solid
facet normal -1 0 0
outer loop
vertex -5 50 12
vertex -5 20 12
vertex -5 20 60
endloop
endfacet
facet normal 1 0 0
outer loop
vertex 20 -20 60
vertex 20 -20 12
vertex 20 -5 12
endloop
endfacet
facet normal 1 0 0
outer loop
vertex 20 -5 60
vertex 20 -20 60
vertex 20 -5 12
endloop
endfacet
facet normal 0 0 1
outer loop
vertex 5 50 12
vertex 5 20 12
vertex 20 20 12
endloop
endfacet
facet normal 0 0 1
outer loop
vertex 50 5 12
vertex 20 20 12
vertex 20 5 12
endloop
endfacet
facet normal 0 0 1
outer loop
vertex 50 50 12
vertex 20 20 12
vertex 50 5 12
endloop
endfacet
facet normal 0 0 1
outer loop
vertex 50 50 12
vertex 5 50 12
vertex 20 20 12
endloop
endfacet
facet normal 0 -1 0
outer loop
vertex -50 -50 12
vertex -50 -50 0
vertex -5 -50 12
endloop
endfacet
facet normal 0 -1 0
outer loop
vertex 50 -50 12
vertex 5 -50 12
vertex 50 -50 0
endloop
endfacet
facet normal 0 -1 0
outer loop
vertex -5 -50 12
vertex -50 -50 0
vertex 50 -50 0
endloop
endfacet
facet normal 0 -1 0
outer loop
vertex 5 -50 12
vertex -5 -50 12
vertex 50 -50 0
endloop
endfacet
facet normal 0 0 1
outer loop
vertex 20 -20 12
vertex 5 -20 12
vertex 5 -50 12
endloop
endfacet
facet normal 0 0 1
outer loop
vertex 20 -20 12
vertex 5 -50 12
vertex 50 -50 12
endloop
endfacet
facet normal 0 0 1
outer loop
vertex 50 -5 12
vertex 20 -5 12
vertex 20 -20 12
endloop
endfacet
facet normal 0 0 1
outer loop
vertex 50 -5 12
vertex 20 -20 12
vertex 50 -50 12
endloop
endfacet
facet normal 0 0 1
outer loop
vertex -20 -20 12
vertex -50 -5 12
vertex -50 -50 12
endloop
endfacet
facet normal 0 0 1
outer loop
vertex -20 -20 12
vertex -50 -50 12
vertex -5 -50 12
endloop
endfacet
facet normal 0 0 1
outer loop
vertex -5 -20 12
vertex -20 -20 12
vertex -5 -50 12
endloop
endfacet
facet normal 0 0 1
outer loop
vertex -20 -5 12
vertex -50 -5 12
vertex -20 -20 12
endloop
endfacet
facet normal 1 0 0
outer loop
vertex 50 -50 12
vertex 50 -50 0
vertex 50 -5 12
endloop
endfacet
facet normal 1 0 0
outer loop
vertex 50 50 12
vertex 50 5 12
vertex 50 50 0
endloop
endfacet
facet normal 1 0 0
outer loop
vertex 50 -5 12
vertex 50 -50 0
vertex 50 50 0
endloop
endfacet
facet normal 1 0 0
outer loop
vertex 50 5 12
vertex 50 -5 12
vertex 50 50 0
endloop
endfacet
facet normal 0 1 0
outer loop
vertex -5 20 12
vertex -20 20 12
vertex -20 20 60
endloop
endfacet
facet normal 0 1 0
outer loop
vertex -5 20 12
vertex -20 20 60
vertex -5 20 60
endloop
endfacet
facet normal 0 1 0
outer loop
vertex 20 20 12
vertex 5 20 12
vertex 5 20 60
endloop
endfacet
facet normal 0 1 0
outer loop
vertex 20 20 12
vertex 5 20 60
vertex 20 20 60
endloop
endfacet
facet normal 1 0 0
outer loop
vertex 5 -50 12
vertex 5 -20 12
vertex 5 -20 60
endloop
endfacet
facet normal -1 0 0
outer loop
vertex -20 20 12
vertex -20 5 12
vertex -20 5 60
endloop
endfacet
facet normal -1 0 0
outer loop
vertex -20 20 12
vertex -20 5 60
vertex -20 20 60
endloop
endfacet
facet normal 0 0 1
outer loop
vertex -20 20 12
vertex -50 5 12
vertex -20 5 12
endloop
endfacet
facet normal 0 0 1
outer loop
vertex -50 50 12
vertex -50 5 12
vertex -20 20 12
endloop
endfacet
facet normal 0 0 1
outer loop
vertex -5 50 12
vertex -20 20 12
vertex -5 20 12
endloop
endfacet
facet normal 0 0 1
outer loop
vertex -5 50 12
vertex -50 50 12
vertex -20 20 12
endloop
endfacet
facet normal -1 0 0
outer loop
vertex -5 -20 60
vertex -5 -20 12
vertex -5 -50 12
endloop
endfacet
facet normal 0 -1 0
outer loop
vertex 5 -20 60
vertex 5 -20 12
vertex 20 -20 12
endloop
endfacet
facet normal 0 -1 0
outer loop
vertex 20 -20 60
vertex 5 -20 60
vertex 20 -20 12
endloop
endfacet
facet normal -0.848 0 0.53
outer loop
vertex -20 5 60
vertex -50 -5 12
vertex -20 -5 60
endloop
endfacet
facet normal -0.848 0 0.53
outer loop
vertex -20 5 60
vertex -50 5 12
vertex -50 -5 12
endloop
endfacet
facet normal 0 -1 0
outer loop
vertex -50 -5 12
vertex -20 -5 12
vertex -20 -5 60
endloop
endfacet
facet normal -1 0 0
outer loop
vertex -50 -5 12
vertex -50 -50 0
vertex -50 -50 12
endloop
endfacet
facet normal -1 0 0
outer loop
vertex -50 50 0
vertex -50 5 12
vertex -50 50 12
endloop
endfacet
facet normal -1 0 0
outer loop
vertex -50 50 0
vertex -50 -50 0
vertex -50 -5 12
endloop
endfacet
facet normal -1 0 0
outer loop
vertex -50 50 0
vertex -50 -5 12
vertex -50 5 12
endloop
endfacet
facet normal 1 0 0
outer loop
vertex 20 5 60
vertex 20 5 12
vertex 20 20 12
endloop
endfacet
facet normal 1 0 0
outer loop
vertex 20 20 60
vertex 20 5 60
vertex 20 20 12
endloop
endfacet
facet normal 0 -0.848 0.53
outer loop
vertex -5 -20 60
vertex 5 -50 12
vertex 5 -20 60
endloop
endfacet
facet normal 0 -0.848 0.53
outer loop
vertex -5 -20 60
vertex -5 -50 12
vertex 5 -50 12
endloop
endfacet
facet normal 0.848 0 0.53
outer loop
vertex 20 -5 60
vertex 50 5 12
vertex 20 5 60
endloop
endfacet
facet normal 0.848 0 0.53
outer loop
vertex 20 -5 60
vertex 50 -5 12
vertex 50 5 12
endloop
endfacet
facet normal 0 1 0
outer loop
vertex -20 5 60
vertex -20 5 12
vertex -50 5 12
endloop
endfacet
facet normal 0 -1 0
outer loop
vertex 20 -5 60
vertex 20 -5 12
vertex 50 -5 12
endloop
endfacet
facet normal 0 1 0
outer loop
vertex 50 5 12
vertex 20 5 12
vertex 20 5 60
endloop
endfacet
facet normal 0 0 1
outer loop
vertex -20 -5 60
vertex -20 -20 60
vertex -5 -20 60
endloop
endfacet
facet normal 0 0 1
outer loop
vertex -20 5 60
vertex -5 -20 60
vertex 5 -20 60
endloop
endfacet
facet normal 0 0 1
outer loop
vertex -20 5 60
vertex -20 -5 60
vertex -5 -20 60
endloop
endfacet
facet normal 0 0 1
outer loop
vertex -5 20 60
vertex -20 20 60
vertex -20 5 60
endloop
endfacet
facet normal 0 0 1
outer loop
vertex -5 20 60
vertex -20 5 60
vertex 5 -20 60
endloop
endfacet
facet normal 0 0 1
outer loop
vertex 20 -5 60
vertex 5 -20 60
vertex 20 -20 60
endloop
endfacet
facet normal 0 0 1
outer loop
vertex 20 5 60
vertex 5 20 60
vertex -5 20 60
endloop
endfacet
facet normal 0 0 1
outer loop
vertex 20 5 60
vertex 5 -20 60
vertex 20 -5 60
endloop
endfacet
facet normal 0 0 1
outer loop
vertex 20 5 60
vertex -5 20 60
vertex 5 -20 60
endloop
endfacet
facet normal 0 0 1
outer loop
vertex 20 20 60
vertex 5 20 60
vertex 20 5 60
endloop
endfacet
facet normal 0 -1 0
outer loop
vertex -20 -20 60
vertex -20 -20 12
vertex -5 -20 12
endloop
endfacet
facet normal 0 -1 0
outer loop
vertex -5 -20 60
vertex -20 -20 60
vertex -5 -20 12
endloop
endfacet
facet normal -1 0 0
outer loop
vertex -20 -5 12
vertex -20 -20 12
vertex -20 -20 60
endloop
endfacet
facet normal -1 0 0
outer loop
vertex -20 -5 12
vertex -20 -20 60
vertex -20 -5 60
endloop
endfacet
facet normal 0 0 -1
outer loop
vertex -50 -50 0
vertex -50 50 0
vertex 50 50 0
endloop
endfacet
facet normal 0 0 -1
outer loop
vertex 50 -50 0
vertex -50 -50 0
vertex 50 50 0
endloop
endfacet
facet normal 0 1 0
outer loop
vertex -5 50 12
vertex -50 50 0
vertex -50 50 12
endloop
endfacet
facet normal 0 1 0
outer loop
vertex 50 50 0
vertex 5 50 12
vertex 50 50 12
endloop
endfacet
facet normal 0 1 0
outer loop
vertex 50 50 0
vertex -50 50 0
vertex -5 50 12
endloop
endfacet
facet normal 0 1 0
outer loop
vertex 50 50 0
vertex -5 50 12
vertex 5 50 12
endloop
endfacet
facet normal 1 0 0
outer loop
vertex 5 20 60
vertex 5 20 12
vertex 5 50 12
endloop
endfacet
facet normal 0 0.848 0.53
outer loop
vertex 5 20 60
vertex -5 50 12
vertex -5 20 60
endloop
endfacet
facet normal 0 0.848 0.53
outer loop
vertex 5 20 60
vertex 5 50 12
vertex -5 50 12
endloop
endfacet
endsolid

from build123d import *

# Parameters (mm, degrees)
SKETCH_W           = 100
SKETCH_H           = 100
PAD_DEPTH          = 12
SKETCH001_W        = 40
SKETCH001_H        = 40
PAD001_DEPTH       = 48
PAD002_DEPTH       = 5
POLARPATTERN_COUNT = 4


with BuildPart() as part:
    # Sketch → Pad (new body)
    with BuildSketch(Plane.XY):
        Rectangle(SKETCH_W, SKETCH_H)
    extrude(amount=PAD_DEPTH)

    # Sketch001 (on Face6 of Pad) → Pad001 (join)
    with BuildSketch(Plane.XY.offset(12)):
        Rectangle(SKETCH001_W, SKETCH001_H)
    extrude(amount=PAD001_DEPTH)

    # Sketch002 → Pad002 (join, symmetric)
    with BuildSketch(Plane.XZ):
        Polygon((20, 60), (20, 12), (50, 12), align=None)
    pad002 = extrude(amount=PAD002_DEPTH, both=True)

    # PolarPattern: Pad002 ×4 about axis
    polarpattern_axis = Axis((0, 0, 0), (0, 0, 1))
    for i in range(1, POLARPATTERN_COUNT):
        add(pad002.rotate(polarpattern_axis, i * 360 / POLARPATTERN_COUNT))


solid = part.part
